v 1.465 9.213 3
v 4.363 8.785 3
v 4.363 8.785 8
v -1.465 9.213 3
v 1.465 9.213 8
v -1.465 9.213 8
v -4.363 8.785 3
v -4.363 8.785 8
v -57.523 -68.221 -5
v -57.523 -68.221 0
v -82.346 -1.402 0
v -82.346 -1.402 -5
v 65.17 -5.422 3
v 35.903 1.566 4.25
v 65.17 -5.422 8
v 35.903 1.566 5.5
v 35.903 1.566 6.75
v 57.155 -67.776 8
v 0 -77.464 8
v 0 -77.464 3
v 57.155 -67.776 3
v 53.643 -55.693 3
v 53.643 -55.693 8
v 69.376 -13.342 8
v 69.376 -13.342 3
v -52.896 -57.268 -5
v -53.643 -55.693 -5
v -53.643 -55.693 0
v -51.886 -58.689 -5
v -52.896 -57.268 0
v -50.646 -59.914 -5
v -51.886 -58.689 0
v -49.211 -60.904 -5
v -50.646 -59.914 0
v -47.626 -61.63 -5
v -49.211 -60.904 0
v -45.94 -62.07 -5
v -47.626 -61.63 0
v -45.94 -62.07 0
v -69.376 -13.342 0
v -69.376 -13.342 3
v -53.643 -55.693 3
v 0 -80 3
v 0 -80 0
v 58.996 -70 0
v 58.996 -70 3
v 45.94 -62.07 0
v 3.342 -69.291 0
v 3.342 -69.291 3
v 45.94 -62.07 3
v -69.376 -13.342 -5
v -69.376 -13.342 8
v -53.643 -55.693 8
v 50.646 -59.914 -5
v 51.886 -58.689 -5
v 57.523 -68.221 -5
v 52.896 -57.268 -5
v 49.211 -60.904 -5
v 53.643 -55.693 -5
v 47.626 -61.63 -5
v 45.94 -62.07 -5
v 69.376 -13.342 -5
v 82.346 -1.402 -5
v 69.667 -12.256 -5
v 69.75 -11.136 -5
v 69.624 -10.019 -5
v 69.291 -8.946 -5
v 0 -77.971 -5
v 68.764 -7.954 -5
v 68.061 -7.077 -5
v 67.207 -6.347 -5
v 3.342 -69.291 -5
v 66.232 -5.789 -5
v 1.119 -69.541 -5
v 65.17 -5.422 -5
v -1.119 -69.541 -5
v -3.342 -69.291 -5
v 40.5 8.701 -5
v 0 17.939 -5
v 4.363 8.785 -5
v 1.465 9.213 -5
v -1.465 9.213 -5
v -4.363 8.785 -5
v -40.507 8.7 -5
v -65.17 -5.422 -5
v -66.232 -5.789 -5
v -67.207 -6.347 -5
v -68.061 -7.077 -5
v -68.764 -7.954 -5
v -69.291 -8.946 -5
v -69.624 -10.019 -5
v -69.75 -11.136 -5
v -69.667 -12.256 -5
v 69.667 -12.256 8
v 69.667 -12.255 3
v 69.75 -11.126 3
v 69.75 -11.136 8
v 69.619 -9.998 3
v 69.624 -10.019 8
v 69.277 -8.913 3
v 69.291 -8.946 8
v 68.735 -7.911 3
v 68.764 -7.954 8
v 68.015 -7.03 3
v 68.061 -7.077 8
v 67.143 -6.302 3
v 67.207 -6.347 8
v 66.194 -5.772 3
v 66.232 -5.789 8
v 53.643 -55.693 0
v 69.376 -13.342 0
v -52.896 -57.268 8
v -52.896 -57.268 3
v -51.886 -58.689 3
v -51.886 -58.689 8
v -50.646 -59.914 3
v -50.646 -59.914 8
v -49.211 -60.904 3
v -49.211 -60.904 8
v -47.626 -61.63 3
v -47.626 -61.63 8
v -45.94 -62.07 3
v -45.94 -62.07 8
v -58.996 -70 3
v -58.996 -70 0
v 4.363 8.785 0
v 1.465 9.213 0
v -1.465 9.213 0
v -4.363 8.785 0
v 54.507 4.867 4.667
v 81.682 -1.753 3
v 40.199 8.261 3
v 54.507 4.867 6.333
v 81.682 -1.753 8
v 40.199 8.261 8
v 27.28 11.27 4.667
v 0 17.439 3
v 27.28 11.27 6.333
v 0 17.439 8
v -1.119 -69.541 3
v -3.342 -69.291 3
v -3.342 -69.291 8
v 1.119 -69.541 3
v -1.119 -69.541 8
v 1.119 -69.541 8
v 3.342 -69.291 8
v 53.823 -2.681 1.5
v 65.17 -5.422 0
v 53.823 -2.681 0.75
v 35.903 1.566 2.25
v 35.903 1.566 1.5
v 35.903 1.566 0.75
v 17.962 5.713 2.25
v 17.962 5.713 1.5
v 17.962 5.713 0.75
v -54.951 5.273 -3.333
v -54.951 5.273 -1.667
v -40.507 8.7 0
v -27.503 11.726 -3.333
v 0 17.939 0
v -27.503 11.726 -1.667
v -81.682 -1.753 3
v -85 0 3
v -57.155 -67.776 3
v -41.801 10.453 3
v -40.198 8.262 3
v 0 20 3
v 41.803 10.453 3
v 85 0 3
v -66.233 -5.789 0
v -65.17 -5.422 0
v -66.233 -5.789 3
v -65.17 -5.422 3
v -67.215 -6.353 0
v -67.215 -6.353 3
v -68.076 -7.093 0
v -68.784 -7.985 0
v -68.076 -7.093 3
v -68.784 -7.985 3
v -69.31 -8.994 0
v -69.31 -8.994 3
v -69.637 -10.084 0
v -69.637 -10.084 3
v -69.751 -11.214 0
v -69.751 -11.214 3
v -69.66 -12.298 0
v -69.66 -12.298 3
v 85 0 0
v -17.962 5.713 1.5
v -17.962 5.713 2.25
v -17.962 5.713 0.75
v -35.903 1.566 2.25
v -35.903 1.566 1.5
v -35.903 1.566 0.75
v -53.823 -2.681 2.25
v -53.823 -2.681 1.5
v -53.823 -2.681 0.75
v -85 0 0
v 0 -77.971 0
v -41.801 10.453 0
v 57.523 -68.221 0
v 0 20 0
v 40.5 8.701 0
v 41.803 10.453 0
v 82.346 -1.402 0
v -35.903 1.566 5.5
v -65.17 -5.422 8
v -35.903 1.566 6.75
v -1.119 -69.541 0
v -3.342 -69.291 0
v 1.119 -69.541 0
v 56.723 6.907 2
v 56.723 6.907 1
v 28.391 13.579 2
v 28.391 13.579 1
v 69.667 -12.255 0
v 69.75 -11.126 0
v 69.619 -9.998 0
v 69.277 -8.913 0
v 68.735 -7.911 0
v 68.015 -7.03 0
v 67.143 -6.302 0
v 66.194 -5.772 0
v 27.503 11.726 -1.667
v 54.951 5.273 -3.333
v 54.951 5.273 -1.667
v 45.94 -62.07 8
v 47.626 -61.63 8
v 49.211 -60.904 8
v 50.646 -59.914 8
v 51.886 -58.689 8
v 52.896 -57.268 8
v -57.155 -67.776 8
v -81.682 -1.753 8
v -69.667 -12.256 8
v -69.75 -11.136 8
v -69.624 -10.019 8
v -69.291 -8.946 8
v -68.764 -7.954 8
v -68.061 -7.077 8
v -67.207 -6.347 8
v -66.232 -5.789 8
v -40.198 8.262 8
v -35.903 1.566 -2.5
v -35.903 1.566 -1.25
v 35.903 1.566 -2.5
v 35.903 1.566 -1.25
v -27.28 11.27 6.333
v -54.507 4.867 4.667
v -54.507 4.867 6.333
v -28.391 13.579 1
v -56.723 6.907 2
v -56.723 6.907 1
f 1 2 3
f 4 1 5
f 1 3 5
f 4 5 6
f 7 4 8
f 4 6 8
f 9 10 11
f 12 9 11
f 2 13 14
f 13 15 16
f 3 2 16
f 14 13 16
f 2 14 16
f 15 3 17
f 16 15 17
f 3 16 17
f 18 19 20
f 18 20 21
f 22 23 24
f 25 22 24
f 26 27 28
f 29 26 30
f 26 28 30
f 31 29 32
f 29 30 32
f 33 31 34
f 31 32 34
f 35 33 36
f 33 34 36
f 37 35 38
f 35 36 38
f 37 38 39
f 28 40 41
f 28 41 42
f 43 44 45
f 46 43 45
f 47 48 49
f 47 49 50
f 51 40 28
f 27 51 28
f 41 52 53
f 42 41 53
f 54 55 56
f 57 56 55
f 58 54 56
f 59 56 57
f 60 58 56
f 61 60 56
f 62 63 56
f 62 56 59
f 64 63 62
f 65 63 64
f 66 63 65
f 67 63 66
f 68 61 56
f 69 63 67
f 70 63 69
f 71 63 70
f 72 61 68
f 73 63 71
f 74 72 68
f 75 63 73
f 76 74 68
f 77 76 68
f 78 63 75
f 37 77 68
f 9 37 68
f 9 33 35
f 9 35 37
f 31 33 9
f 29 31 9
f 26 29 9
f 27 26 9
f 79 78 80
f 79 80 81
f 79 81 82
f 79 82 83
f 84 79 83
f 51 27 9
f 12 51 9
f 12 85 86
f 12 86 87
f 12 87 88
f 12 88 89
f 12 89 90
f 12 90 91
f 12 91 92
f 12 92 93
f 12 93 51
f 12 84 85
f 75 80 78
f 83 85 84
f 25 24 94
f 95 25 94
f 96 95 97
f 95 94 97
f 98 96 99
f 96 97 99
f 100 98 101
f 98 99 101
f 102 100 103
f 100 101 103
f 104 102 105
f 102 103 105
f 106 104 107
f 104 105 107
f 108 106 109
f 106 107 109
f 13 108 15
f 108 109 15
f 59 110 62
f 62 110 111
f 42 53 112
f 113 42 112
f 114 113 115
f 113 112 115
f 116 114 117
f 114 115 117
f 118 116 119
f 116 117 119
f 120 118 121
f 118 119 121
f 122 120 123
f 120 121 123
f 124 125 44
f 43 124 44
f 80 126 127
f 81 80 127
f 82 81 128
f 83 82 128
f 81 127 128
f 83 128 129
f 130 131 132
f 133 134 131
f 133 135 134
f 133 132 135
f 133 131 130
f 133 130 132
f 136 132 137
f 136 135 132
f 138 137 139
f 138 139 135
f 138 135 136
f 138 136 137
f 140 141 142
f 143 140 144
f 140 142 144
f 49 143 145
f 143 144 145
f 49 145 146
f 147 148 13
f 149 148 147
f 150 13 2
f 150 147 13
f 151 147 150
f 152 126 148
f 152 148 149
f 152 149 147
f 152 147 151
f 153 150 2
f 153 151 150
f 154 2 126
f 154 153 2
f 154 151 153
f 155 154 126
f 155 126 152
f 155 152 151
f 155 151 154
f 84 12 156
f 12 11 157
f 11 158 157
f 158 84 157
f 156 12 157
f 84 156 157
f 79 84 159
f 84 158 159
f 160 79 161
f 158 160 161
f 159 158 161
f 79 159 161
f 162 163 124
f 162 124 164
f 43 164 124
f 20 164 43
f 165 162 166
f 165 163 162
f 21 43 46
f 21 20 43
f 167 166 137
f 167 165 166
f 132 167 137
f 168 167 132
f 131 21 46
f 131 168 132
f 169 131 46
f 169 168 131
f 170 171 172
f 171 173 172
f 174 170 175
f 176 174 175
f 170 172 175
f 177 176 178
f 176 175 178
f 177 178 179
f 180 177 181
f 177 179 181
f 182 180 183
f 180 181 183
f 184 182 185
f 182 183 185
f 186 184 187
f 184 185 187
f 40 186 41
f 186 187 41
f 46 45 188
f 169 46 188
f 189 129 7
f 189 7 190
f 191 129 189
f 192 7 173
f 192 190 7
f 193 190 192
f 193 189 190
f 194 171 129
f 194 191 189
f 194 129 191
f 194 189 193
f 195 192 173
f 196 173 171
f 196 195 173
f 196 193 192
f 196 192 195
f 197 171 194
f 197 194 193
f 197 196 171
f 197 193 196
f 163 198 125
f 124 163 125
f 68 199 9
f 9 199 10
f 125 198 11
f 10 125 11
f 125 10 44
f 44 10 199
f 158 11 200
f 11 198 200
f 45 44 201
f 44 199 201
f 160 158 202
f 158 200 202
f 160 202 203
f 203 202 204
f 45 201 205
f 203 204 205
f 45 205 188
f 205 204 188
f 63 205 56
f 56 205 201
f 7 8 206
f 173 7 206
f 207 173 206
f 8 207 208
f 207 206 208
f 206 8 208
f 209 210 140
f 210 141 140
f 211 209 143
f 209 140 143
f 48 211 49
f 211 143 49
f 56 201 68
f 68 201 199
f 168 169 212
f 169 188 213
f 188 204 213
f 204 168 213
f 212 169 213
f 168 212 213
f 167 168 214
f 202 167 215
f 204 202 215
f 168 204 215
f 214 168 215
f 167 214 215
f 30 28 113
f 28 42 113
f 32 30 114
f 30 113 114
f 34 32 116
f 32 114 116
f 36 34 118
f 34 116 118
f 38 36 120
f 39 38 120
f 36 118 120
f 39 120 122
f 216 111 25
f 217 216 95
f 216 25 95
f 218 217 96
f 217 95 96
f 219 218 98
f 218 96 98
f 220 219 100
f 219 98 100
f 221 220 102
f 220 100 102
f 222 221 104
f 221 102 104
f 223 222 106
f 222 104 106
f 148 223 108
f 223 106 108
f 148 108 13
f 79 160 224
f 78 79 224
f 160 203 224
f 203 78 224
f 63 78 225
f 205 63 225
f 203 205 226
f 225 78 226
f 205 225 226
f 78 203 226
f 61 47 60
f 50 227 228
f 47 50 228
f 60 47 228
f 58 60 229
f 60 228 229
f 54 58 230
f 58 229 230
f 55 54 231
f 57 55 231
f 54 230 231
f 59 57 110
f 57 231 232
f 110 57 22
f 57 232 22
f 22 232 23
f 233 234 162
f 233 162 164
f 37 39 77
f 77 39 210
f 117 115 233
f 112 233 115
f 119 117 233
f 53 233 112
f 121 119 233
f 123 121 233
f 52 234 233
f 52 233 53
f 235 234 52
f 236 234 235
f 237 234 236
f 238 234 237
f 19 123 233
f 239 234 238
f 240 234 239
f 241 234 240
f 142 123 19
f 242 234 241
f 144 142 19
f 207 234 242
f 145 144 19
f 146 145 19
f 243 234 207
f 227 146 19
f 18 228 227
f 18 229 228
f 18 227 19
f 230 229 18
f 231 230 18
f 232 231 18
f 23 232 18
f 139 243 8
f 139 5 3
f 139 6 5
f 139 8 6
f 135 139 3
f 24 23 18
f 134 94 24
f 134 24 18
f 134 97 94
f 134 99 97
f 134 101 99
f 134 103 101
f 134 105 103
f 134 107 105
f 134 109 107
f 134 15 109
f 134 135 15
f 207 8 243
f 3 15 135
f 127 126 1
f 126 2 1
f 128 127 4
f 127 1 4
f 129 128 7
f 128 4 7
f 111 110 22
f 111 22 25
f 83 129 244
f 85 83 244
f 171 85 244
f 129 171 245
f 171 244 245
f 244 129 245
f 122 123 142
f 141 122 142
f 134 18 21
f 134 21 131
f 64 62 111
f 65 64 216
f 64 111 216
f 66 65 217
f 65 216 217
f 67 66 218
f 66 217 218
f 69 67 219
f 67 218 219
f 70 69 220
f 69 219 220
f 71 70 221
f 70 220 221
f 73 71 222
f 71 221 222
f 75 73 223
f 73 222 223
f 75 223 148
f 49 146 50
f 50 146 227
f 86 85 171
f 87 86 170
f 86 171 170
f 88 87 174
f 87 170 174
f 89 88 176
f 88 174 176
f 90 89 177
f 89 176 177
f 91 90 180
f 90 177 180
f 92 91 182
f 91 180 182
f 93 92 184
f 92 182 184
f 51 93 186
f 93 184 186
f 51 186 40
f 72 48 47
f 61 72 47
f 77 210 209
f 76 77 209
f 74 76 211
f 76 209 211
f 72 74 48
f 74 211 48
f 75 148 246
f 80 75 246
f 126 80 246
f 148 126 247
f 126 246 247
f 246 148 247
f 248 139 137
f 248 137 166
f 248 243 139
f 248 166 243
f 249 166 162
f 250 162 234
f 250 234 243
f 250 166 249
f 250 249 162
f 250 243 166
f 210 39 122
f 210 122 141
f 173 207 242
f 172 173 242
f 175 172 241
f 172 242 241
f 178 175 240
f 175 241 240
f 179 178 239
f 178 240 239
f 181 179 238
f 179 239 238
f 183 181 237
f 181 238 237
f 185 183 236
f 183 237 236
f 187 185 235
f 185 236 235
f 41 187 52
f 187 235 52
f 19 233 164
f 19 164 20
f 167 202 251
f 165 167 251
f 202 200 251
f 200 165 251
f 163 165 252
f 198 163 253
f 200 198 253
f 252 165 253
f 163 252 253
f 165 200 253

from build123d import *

# Parameters (mm, degrees)
BOSS_EXTRUDE1_DEPTH = 3
FILLET1_R           = 20
FILLET2_R           = 10
FILLET3_R           = 6
BOSS_EXTRUDE2_START = 5
BOSS_EXTRUDE2_DEPTH = 5
BOSS_EXTRUDE3_DEPTH = 5


with BuildPart() as part:
    # Sketch1 → Boss-Extrude1 (new body)
    with BuildSketch(Plane.XY):
        with BuildLine():
            Line((58.995636199, -70), (85.000010905, 5.7991e-05))
            add(Edge.make_bspline(
                [(85.000010905, 5.7991e-05), (56.750474686, 7.0174992), (28.420775895, 13.71150164), (7.678e-06, 19.999882532)],
                knots=[0, 0, 0, 0, 1, 1, 1, 1], degree=3))
            add(Edge.make_bspline(
                [(7.678e-06, 19.999882532), (-28.420729921, 13.711538103), (-56.750527687, 7.017544413), (-85.000042152, 0.000142104)],
                knots=[0, 0, 0, 0, 1, 1, 1, 1], degree=3))
            Line((-85.000042152, 0.000142104), (-58.995636199, -70))
            Line((-58.995636199, -70), (0, -80))
            Line((0, -80), (58.995636199, -70))
        make_face()
        with BuildLine():
            Line((51.632125707, -61.105504126), (71.72329576, -7.02294745))
            add(Edge.make_bspline(
                [(71.72329576, -7.02294745), (65.760246295, -5.560581522), (53.826176048, -2.665485282), (35.906371118, 1.582198174), (17.96537234, 5.730748209), (5.991311045, 8.427016674), (2.578e-06, 9.757206823)],
                knots=[0.12850852, 0.12850852, 0.12850852, 0.12850852, 0.340025725, 0.551542931, 0.763060137, 0.974577343, 0.974577343, 0.974577343, 0.974577343], degree=3))
            add(Edge.make_bspline(
                [(2.578e-06, 9.757206823), (-5.991303797, 8.427023399), (-17.965355756, 5.730769647), (-35.906372035, 1.582235194), (-53.826198007, -2.665432907), (-65.760270504, -5.560515659), (-71.723322613, -7.022875166)],
                knots=[0.025422687, 0.025422687, 0.025422687, 0.025422687, 0.236939832, 0.448456977, 0.659974121, 0.871491266, 0.871491266, 0.871491266, 0.871491266], degree=3))
            Line((-71.723322613, -7.022875166), (-51.632125707, -61.105504126))
            Line((-51.632125707, -61.105504126), (0, -69.857359184))
            Line((0, -69.857359184), (51.632125707, -61.105504126))
        make_face(mode=Mode.SUBTRACT)
    extrude(amount=BOSS_EXTRUDE1_DEPTH)

    # Fillet1
    fillet1_edges = [part.edges().sort_by_distance(p)[0] for p in [
        (0, -69.857359184, 1.5),
        (2.578e-06, 9.757206823, 1.5),
    ]]
    fillet(fillet1_edges, radius=FILLET1_R)

    # Fillet2
    fillet2_edges = [part.edges().sort_by_distance(p)[0] for p in [
        (51.632125707, -61.105504126, 1.5),
        (-51.632125707, -61.105504126, 1.5),
    ]]
    fillet(fillet2_edges, radius=FILLET2_R)

    # Fillet3
    fillet3_edges = [part.edges().sort_by_distance(p)[0] for p in [
        (71.72329576, -7.02294745, 1.5),
        (-71.723322613, -7.022875166, 1.5),
    ]]
    fillet(fillet3_edges, radius=FILLET3_R)

    # Sketch2 → Boss-Extrude2 (add)
    with BuildSketch(Plane.XY.offset(3).offset(BOSS_EXTRUDE2_START)):
        with BuildLine():
            Line((-81.681959277, -1.75265922), (-57.154758576, -67.776376032))
            Line((-57.154758576, -67.776376032), (0, -77.464339796))
            Line((0, -77.464339796), (57.154758576, -67.776376032))
            Line((57.154758576, -67.776376032), (81.681929126, -1.752740382))
            add(Edge.make_bspline(
                [(81.681929126, -1.752740382), (54.532239341, 4.970251393), (27.308171531, 11.391977282), (6.404e-06, 17.439367697)],
                knots=[0, 0, 0, 0, 1, 1, 1, 1], degree=3))
            add(Edge.make_bspline(
                [(6.404e-06, 17.439367697), (-27.308135136, 11.392011032), (-54.532288876, 4.970295529), (-81.681959277, -1.75265922)],
                knots=[0, 0, 0, 0, 1, 1, 1, 1], degree=3))
        make_face()
        with BuildLine():
            Line((-69.376008475, -13.341509152), (-53.642677645, -55.693385824))
            ThreePointArc((-53.642677645, -55.693385824), (-50.645602116, -59.913867336), (-45.939817671, -62.070373463))
            Line((-45.939817671, -62.070373463), (-3.342404912, -69.290807973))
            ThreePointArc((-3.342404912, -69.290807973), (0, -69.572077553), (3.342404912, -69.290807973))
            Line((3.342404912, -69.290807973), (45.939817671, -62.070373463))
            ThreePointArc((45.939817671, -62.070373463), (50.645602116, -59.913867336), (53.642677645, -55.693385824))
            Line((53.642677645, -55.693385824), (69.375984259, -13.341574337))
            ThreePointArc((69.375984259, -13.341574337), (69.05053211, -8.437764256), (65.169862303, -5.422192294))
            add(Edge.make_bspline(
                [(65.169862303, -5.422192294), (61.388993913, -4.502380085), (51.638475989, -2.146916169), (35.906371118, 1.582198174), (19.417348722, 5.39500343), (8.898318707, 7.771361324), (4.363182833, 8.785163741)],
                knots=[0.205976361, 0.205976361, 0.205976361, 0.205976361, 0.340025725, 0.551542931, 0.763060137, 0.923222679, 0.923222679, 0.923222679, 0.923222679], degree=3))
            ThreePointArc((4.363182833, 8.785163741), (2.348e-06, 9.266901295), (-4.363178618, 8.785168098))
            add(Edge.make_bspline(
                [(-4.363178618, 8.785168098), (-8.898311373, 7.771371135), (-19.41733449, 5.395025913), (-35.906372035, 1.582235194), (-51.638493171, -2.146865145), (-61.389012491, -4.502317987), (-65.169880027, -5.422125529)],
                knots=[0.076777369, 0.076777369, 0.076777369, 0.076777369, 0.236939832, 0.448456977, 0.659974121, 0.794023369, 0.794023369, 0.794023369, 0.794023369], degree=3))
            ThreePointArc((-65.169880027, -5.422125529), (-69.050554759, -8.437696121), (-69.376008475, -13.341509152))
        make_face(mode=Mode.SUBTRACT)
    extrude(amount=-BOSS_EXTRUDE2_DEPTH)

    # Sketch3 → Boss-Extrude3 (add)
    with BuildSketch(Plane(origin=(0, 0, 0), x_dir=(-1, 0, 0), z_dir=(0, 0, -1))):
        with BuildLine():
            Line((57.522934276, -68.221100795), (82.345641792, -1.401949233))
            add(Edge.make_bspline(
                [(82.345641792, -1.401949233), (54.976968444, 5.379009049), (27.531586141, 11.851868369), (0.000183244, 17.939432259)],
                knots=[-0.01124673, -0.01124673, -0.01124673, -0.01124673, 1.075105268, 1.075105268, 1.075105268, 1.075105268], degree=3))
            add(Edge.make_bspline(
                [(0.000183244, 17.939432259), (-27.531342023, 11.851872874), (-54.976750263, 5.379036047), (-82.345641148, -1.401950967)],
                knots=[-0.075105482, -0.075105482, -0.075105482, -0.075105482, 1.011252332, 1.011252332, 1.011252332, 1.011252332], degree=3))
            Line((-82.345641148, -1.401950967), (-57.522934276, -68.221100795))
            Line((-57.522934276, -68.221100795), (0, -77.971471837))
            Line((0, -77.971471837), (57.522934276, -68.221100795))
        make_face()
        with BuildLine():
            Line((-53.642677645, -55.693385824), (-69.375984259, -13.341574337))
            ThreePointArc((-69.375984259, -13.341574337), (-69.05053211, -8.437764256), (-65.169862303, -5.422192294))
            add(Edge.make_bspline(
                [(-65.169862303, -5.422192294), (-61.388993913, -4.502380085), (-51.638475989, -2.146916169), (-35.906371118, 1.582198174), (-19.417348722, 5.39500343), (-8.898318707, 7.771361324), (-4.363182833, 8.785163741)],
                knots=[0.205976361, 0.205976361, 0.205976361, 0.205976361, 0.340025725, 0.551542931, 0.763060137, 0.923222679, 0.923222679, 0.923222679, 0.923222679], degree=3))
            ThreePointArc((-4.363182833, 8.785163741), (-2.348e-06, 9.266901295), (4.363178618, 8.785168098))
            add(Edge.make_bspline(
                [(4.363178618, 8.785168098), (8.898311373, 7.771371135), (19.41733449, 5.395025913), (35.906372035, 1.582235194), (51.638493171, -2.146865145), (61.389012491, -4.502317987), (65.169880027, -5.422125529)],
                knots=[0.076777369, 0.076777369, 0.076777369, 0.076777369, 0.236939832, 0.448456977, 0.659974121, 0.794023369, 0.794023369, 0.794023369, 0.794023369], degree=3))
            ThreePointArc((65.169880027, -5.422125529), (69.050554759, -8.437696121), (69.376008475, -13.341509152))
            Line((69.376008475, -13.341509152), (53.642677645, -55.693385824))
            ThreePointArc((53.642677645, -55.693385824), (50.645602116, -59.913867336), (45.939817671, -62.070373463))
            Line((45.939817671, -62.070373463), (3.342404912, -69.290807973))
            ThreePointArc((3.342404912, -69.290807973), (0, -69.572077553), (-3.342404912, -69.290807973))
            Line((-3.342404912, -69.290807973), (-45.939817671, -62.070373463))
            ThreePointArc((-45.939817671, -62.070373463), (-50.645602116, -59.913867336), (-53.642677645, -55.693385824))
        make_face(mode=Mode.SUBTRACT)
    extrude(amount=BOSS_EXTRUDE3_DEPTH)


solid = part.part
